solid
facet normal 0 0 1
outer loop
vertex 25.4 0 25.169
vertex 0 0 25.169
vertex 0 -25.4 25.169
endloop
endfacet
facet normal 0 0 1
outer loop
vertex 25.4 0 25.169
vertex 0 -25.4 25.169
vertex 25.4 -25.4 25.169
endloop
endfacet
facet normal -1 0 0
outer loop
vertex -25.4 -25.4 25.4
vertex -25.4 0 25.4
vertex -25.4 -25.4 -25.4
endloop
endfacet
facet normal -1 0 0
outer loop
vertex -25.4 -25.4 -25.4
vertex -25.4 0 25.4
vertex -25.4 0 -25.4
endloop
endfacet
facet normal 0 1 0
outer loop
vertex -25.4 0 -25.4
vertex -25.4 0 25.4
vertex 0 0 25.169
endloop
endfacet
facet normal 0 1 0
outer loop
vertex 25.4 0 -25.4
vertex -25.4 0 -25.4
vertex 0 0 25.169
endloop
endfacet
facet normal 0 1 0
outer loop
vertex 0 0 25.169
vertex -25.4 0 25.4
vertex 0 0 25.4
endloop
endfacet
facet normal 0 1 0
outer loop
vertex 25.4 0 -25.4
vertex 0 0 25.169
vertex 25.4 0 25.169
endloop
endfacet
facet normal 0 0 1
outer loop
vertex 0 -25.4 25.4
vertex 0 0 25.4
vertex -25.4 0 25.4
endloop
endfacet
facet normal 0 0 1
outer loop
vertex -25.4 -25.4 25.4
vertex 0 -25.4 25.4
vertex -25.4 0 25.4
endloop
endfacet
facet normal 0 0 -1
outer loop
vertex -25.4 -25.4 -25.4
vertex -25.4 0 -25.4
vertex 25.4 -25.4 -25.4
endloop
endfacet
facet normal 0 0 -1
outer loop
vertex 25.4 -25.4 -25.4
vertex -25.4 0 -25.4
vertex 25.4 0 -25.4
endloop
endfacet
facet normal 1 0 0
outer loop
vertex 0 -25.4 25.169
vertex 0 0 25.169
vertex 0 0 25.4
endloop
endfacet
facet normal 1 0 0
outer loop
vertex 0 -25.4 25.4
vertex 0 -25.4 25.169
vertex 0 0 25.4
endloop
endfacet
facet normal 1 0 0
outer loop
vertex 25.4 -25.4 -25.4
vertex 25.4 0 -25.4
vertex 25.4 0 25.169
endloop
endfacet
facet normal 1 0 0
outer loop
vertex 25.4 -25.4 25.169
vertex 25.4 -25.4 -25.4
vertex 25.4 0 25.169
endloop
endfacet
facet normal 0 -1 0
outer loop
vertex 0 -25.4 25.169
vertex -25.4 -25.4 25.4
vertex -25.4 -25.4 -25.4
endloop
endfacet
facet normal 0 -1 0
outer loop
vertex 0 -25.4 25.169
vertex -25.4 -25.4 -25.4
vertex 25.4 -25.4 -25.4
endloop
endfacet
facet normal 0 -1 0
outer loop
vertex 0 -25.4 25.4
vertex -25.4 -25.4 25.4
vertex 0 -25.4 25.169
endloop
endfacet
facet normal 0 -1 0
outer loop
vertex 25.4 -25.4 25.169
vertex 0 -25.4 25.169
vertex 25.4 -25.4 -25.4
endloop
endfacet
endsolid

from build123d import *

# Parameters (mm, degrees)
F0_W     = 25.4
F0_H     = 25.169303
F0_H_2   = 25.4
F1_DEPTH = 25.4


with BuildPart() as f1:
    # F0 (on Front) → F1 (new body)
    with BuildSketch(Plane.XZ):
        with Locations((12.7, 12.584651)):
            Rectangle(F0_W, F0_H)
        Polygon((-25.4, 0), (0, 0), (0, 25.169303), (0, 25.4), (-25.4, 25.4), align=None)
        with Locations((-12.7, -12.7)):
            Rectangle(F0_W, F0_H_2)
        with Locations((12.7, -12.7)):
            Rectangle(F0_W, F0_H_2)
    extrude(amount=F1_DEPTH)


solid = f1.part
